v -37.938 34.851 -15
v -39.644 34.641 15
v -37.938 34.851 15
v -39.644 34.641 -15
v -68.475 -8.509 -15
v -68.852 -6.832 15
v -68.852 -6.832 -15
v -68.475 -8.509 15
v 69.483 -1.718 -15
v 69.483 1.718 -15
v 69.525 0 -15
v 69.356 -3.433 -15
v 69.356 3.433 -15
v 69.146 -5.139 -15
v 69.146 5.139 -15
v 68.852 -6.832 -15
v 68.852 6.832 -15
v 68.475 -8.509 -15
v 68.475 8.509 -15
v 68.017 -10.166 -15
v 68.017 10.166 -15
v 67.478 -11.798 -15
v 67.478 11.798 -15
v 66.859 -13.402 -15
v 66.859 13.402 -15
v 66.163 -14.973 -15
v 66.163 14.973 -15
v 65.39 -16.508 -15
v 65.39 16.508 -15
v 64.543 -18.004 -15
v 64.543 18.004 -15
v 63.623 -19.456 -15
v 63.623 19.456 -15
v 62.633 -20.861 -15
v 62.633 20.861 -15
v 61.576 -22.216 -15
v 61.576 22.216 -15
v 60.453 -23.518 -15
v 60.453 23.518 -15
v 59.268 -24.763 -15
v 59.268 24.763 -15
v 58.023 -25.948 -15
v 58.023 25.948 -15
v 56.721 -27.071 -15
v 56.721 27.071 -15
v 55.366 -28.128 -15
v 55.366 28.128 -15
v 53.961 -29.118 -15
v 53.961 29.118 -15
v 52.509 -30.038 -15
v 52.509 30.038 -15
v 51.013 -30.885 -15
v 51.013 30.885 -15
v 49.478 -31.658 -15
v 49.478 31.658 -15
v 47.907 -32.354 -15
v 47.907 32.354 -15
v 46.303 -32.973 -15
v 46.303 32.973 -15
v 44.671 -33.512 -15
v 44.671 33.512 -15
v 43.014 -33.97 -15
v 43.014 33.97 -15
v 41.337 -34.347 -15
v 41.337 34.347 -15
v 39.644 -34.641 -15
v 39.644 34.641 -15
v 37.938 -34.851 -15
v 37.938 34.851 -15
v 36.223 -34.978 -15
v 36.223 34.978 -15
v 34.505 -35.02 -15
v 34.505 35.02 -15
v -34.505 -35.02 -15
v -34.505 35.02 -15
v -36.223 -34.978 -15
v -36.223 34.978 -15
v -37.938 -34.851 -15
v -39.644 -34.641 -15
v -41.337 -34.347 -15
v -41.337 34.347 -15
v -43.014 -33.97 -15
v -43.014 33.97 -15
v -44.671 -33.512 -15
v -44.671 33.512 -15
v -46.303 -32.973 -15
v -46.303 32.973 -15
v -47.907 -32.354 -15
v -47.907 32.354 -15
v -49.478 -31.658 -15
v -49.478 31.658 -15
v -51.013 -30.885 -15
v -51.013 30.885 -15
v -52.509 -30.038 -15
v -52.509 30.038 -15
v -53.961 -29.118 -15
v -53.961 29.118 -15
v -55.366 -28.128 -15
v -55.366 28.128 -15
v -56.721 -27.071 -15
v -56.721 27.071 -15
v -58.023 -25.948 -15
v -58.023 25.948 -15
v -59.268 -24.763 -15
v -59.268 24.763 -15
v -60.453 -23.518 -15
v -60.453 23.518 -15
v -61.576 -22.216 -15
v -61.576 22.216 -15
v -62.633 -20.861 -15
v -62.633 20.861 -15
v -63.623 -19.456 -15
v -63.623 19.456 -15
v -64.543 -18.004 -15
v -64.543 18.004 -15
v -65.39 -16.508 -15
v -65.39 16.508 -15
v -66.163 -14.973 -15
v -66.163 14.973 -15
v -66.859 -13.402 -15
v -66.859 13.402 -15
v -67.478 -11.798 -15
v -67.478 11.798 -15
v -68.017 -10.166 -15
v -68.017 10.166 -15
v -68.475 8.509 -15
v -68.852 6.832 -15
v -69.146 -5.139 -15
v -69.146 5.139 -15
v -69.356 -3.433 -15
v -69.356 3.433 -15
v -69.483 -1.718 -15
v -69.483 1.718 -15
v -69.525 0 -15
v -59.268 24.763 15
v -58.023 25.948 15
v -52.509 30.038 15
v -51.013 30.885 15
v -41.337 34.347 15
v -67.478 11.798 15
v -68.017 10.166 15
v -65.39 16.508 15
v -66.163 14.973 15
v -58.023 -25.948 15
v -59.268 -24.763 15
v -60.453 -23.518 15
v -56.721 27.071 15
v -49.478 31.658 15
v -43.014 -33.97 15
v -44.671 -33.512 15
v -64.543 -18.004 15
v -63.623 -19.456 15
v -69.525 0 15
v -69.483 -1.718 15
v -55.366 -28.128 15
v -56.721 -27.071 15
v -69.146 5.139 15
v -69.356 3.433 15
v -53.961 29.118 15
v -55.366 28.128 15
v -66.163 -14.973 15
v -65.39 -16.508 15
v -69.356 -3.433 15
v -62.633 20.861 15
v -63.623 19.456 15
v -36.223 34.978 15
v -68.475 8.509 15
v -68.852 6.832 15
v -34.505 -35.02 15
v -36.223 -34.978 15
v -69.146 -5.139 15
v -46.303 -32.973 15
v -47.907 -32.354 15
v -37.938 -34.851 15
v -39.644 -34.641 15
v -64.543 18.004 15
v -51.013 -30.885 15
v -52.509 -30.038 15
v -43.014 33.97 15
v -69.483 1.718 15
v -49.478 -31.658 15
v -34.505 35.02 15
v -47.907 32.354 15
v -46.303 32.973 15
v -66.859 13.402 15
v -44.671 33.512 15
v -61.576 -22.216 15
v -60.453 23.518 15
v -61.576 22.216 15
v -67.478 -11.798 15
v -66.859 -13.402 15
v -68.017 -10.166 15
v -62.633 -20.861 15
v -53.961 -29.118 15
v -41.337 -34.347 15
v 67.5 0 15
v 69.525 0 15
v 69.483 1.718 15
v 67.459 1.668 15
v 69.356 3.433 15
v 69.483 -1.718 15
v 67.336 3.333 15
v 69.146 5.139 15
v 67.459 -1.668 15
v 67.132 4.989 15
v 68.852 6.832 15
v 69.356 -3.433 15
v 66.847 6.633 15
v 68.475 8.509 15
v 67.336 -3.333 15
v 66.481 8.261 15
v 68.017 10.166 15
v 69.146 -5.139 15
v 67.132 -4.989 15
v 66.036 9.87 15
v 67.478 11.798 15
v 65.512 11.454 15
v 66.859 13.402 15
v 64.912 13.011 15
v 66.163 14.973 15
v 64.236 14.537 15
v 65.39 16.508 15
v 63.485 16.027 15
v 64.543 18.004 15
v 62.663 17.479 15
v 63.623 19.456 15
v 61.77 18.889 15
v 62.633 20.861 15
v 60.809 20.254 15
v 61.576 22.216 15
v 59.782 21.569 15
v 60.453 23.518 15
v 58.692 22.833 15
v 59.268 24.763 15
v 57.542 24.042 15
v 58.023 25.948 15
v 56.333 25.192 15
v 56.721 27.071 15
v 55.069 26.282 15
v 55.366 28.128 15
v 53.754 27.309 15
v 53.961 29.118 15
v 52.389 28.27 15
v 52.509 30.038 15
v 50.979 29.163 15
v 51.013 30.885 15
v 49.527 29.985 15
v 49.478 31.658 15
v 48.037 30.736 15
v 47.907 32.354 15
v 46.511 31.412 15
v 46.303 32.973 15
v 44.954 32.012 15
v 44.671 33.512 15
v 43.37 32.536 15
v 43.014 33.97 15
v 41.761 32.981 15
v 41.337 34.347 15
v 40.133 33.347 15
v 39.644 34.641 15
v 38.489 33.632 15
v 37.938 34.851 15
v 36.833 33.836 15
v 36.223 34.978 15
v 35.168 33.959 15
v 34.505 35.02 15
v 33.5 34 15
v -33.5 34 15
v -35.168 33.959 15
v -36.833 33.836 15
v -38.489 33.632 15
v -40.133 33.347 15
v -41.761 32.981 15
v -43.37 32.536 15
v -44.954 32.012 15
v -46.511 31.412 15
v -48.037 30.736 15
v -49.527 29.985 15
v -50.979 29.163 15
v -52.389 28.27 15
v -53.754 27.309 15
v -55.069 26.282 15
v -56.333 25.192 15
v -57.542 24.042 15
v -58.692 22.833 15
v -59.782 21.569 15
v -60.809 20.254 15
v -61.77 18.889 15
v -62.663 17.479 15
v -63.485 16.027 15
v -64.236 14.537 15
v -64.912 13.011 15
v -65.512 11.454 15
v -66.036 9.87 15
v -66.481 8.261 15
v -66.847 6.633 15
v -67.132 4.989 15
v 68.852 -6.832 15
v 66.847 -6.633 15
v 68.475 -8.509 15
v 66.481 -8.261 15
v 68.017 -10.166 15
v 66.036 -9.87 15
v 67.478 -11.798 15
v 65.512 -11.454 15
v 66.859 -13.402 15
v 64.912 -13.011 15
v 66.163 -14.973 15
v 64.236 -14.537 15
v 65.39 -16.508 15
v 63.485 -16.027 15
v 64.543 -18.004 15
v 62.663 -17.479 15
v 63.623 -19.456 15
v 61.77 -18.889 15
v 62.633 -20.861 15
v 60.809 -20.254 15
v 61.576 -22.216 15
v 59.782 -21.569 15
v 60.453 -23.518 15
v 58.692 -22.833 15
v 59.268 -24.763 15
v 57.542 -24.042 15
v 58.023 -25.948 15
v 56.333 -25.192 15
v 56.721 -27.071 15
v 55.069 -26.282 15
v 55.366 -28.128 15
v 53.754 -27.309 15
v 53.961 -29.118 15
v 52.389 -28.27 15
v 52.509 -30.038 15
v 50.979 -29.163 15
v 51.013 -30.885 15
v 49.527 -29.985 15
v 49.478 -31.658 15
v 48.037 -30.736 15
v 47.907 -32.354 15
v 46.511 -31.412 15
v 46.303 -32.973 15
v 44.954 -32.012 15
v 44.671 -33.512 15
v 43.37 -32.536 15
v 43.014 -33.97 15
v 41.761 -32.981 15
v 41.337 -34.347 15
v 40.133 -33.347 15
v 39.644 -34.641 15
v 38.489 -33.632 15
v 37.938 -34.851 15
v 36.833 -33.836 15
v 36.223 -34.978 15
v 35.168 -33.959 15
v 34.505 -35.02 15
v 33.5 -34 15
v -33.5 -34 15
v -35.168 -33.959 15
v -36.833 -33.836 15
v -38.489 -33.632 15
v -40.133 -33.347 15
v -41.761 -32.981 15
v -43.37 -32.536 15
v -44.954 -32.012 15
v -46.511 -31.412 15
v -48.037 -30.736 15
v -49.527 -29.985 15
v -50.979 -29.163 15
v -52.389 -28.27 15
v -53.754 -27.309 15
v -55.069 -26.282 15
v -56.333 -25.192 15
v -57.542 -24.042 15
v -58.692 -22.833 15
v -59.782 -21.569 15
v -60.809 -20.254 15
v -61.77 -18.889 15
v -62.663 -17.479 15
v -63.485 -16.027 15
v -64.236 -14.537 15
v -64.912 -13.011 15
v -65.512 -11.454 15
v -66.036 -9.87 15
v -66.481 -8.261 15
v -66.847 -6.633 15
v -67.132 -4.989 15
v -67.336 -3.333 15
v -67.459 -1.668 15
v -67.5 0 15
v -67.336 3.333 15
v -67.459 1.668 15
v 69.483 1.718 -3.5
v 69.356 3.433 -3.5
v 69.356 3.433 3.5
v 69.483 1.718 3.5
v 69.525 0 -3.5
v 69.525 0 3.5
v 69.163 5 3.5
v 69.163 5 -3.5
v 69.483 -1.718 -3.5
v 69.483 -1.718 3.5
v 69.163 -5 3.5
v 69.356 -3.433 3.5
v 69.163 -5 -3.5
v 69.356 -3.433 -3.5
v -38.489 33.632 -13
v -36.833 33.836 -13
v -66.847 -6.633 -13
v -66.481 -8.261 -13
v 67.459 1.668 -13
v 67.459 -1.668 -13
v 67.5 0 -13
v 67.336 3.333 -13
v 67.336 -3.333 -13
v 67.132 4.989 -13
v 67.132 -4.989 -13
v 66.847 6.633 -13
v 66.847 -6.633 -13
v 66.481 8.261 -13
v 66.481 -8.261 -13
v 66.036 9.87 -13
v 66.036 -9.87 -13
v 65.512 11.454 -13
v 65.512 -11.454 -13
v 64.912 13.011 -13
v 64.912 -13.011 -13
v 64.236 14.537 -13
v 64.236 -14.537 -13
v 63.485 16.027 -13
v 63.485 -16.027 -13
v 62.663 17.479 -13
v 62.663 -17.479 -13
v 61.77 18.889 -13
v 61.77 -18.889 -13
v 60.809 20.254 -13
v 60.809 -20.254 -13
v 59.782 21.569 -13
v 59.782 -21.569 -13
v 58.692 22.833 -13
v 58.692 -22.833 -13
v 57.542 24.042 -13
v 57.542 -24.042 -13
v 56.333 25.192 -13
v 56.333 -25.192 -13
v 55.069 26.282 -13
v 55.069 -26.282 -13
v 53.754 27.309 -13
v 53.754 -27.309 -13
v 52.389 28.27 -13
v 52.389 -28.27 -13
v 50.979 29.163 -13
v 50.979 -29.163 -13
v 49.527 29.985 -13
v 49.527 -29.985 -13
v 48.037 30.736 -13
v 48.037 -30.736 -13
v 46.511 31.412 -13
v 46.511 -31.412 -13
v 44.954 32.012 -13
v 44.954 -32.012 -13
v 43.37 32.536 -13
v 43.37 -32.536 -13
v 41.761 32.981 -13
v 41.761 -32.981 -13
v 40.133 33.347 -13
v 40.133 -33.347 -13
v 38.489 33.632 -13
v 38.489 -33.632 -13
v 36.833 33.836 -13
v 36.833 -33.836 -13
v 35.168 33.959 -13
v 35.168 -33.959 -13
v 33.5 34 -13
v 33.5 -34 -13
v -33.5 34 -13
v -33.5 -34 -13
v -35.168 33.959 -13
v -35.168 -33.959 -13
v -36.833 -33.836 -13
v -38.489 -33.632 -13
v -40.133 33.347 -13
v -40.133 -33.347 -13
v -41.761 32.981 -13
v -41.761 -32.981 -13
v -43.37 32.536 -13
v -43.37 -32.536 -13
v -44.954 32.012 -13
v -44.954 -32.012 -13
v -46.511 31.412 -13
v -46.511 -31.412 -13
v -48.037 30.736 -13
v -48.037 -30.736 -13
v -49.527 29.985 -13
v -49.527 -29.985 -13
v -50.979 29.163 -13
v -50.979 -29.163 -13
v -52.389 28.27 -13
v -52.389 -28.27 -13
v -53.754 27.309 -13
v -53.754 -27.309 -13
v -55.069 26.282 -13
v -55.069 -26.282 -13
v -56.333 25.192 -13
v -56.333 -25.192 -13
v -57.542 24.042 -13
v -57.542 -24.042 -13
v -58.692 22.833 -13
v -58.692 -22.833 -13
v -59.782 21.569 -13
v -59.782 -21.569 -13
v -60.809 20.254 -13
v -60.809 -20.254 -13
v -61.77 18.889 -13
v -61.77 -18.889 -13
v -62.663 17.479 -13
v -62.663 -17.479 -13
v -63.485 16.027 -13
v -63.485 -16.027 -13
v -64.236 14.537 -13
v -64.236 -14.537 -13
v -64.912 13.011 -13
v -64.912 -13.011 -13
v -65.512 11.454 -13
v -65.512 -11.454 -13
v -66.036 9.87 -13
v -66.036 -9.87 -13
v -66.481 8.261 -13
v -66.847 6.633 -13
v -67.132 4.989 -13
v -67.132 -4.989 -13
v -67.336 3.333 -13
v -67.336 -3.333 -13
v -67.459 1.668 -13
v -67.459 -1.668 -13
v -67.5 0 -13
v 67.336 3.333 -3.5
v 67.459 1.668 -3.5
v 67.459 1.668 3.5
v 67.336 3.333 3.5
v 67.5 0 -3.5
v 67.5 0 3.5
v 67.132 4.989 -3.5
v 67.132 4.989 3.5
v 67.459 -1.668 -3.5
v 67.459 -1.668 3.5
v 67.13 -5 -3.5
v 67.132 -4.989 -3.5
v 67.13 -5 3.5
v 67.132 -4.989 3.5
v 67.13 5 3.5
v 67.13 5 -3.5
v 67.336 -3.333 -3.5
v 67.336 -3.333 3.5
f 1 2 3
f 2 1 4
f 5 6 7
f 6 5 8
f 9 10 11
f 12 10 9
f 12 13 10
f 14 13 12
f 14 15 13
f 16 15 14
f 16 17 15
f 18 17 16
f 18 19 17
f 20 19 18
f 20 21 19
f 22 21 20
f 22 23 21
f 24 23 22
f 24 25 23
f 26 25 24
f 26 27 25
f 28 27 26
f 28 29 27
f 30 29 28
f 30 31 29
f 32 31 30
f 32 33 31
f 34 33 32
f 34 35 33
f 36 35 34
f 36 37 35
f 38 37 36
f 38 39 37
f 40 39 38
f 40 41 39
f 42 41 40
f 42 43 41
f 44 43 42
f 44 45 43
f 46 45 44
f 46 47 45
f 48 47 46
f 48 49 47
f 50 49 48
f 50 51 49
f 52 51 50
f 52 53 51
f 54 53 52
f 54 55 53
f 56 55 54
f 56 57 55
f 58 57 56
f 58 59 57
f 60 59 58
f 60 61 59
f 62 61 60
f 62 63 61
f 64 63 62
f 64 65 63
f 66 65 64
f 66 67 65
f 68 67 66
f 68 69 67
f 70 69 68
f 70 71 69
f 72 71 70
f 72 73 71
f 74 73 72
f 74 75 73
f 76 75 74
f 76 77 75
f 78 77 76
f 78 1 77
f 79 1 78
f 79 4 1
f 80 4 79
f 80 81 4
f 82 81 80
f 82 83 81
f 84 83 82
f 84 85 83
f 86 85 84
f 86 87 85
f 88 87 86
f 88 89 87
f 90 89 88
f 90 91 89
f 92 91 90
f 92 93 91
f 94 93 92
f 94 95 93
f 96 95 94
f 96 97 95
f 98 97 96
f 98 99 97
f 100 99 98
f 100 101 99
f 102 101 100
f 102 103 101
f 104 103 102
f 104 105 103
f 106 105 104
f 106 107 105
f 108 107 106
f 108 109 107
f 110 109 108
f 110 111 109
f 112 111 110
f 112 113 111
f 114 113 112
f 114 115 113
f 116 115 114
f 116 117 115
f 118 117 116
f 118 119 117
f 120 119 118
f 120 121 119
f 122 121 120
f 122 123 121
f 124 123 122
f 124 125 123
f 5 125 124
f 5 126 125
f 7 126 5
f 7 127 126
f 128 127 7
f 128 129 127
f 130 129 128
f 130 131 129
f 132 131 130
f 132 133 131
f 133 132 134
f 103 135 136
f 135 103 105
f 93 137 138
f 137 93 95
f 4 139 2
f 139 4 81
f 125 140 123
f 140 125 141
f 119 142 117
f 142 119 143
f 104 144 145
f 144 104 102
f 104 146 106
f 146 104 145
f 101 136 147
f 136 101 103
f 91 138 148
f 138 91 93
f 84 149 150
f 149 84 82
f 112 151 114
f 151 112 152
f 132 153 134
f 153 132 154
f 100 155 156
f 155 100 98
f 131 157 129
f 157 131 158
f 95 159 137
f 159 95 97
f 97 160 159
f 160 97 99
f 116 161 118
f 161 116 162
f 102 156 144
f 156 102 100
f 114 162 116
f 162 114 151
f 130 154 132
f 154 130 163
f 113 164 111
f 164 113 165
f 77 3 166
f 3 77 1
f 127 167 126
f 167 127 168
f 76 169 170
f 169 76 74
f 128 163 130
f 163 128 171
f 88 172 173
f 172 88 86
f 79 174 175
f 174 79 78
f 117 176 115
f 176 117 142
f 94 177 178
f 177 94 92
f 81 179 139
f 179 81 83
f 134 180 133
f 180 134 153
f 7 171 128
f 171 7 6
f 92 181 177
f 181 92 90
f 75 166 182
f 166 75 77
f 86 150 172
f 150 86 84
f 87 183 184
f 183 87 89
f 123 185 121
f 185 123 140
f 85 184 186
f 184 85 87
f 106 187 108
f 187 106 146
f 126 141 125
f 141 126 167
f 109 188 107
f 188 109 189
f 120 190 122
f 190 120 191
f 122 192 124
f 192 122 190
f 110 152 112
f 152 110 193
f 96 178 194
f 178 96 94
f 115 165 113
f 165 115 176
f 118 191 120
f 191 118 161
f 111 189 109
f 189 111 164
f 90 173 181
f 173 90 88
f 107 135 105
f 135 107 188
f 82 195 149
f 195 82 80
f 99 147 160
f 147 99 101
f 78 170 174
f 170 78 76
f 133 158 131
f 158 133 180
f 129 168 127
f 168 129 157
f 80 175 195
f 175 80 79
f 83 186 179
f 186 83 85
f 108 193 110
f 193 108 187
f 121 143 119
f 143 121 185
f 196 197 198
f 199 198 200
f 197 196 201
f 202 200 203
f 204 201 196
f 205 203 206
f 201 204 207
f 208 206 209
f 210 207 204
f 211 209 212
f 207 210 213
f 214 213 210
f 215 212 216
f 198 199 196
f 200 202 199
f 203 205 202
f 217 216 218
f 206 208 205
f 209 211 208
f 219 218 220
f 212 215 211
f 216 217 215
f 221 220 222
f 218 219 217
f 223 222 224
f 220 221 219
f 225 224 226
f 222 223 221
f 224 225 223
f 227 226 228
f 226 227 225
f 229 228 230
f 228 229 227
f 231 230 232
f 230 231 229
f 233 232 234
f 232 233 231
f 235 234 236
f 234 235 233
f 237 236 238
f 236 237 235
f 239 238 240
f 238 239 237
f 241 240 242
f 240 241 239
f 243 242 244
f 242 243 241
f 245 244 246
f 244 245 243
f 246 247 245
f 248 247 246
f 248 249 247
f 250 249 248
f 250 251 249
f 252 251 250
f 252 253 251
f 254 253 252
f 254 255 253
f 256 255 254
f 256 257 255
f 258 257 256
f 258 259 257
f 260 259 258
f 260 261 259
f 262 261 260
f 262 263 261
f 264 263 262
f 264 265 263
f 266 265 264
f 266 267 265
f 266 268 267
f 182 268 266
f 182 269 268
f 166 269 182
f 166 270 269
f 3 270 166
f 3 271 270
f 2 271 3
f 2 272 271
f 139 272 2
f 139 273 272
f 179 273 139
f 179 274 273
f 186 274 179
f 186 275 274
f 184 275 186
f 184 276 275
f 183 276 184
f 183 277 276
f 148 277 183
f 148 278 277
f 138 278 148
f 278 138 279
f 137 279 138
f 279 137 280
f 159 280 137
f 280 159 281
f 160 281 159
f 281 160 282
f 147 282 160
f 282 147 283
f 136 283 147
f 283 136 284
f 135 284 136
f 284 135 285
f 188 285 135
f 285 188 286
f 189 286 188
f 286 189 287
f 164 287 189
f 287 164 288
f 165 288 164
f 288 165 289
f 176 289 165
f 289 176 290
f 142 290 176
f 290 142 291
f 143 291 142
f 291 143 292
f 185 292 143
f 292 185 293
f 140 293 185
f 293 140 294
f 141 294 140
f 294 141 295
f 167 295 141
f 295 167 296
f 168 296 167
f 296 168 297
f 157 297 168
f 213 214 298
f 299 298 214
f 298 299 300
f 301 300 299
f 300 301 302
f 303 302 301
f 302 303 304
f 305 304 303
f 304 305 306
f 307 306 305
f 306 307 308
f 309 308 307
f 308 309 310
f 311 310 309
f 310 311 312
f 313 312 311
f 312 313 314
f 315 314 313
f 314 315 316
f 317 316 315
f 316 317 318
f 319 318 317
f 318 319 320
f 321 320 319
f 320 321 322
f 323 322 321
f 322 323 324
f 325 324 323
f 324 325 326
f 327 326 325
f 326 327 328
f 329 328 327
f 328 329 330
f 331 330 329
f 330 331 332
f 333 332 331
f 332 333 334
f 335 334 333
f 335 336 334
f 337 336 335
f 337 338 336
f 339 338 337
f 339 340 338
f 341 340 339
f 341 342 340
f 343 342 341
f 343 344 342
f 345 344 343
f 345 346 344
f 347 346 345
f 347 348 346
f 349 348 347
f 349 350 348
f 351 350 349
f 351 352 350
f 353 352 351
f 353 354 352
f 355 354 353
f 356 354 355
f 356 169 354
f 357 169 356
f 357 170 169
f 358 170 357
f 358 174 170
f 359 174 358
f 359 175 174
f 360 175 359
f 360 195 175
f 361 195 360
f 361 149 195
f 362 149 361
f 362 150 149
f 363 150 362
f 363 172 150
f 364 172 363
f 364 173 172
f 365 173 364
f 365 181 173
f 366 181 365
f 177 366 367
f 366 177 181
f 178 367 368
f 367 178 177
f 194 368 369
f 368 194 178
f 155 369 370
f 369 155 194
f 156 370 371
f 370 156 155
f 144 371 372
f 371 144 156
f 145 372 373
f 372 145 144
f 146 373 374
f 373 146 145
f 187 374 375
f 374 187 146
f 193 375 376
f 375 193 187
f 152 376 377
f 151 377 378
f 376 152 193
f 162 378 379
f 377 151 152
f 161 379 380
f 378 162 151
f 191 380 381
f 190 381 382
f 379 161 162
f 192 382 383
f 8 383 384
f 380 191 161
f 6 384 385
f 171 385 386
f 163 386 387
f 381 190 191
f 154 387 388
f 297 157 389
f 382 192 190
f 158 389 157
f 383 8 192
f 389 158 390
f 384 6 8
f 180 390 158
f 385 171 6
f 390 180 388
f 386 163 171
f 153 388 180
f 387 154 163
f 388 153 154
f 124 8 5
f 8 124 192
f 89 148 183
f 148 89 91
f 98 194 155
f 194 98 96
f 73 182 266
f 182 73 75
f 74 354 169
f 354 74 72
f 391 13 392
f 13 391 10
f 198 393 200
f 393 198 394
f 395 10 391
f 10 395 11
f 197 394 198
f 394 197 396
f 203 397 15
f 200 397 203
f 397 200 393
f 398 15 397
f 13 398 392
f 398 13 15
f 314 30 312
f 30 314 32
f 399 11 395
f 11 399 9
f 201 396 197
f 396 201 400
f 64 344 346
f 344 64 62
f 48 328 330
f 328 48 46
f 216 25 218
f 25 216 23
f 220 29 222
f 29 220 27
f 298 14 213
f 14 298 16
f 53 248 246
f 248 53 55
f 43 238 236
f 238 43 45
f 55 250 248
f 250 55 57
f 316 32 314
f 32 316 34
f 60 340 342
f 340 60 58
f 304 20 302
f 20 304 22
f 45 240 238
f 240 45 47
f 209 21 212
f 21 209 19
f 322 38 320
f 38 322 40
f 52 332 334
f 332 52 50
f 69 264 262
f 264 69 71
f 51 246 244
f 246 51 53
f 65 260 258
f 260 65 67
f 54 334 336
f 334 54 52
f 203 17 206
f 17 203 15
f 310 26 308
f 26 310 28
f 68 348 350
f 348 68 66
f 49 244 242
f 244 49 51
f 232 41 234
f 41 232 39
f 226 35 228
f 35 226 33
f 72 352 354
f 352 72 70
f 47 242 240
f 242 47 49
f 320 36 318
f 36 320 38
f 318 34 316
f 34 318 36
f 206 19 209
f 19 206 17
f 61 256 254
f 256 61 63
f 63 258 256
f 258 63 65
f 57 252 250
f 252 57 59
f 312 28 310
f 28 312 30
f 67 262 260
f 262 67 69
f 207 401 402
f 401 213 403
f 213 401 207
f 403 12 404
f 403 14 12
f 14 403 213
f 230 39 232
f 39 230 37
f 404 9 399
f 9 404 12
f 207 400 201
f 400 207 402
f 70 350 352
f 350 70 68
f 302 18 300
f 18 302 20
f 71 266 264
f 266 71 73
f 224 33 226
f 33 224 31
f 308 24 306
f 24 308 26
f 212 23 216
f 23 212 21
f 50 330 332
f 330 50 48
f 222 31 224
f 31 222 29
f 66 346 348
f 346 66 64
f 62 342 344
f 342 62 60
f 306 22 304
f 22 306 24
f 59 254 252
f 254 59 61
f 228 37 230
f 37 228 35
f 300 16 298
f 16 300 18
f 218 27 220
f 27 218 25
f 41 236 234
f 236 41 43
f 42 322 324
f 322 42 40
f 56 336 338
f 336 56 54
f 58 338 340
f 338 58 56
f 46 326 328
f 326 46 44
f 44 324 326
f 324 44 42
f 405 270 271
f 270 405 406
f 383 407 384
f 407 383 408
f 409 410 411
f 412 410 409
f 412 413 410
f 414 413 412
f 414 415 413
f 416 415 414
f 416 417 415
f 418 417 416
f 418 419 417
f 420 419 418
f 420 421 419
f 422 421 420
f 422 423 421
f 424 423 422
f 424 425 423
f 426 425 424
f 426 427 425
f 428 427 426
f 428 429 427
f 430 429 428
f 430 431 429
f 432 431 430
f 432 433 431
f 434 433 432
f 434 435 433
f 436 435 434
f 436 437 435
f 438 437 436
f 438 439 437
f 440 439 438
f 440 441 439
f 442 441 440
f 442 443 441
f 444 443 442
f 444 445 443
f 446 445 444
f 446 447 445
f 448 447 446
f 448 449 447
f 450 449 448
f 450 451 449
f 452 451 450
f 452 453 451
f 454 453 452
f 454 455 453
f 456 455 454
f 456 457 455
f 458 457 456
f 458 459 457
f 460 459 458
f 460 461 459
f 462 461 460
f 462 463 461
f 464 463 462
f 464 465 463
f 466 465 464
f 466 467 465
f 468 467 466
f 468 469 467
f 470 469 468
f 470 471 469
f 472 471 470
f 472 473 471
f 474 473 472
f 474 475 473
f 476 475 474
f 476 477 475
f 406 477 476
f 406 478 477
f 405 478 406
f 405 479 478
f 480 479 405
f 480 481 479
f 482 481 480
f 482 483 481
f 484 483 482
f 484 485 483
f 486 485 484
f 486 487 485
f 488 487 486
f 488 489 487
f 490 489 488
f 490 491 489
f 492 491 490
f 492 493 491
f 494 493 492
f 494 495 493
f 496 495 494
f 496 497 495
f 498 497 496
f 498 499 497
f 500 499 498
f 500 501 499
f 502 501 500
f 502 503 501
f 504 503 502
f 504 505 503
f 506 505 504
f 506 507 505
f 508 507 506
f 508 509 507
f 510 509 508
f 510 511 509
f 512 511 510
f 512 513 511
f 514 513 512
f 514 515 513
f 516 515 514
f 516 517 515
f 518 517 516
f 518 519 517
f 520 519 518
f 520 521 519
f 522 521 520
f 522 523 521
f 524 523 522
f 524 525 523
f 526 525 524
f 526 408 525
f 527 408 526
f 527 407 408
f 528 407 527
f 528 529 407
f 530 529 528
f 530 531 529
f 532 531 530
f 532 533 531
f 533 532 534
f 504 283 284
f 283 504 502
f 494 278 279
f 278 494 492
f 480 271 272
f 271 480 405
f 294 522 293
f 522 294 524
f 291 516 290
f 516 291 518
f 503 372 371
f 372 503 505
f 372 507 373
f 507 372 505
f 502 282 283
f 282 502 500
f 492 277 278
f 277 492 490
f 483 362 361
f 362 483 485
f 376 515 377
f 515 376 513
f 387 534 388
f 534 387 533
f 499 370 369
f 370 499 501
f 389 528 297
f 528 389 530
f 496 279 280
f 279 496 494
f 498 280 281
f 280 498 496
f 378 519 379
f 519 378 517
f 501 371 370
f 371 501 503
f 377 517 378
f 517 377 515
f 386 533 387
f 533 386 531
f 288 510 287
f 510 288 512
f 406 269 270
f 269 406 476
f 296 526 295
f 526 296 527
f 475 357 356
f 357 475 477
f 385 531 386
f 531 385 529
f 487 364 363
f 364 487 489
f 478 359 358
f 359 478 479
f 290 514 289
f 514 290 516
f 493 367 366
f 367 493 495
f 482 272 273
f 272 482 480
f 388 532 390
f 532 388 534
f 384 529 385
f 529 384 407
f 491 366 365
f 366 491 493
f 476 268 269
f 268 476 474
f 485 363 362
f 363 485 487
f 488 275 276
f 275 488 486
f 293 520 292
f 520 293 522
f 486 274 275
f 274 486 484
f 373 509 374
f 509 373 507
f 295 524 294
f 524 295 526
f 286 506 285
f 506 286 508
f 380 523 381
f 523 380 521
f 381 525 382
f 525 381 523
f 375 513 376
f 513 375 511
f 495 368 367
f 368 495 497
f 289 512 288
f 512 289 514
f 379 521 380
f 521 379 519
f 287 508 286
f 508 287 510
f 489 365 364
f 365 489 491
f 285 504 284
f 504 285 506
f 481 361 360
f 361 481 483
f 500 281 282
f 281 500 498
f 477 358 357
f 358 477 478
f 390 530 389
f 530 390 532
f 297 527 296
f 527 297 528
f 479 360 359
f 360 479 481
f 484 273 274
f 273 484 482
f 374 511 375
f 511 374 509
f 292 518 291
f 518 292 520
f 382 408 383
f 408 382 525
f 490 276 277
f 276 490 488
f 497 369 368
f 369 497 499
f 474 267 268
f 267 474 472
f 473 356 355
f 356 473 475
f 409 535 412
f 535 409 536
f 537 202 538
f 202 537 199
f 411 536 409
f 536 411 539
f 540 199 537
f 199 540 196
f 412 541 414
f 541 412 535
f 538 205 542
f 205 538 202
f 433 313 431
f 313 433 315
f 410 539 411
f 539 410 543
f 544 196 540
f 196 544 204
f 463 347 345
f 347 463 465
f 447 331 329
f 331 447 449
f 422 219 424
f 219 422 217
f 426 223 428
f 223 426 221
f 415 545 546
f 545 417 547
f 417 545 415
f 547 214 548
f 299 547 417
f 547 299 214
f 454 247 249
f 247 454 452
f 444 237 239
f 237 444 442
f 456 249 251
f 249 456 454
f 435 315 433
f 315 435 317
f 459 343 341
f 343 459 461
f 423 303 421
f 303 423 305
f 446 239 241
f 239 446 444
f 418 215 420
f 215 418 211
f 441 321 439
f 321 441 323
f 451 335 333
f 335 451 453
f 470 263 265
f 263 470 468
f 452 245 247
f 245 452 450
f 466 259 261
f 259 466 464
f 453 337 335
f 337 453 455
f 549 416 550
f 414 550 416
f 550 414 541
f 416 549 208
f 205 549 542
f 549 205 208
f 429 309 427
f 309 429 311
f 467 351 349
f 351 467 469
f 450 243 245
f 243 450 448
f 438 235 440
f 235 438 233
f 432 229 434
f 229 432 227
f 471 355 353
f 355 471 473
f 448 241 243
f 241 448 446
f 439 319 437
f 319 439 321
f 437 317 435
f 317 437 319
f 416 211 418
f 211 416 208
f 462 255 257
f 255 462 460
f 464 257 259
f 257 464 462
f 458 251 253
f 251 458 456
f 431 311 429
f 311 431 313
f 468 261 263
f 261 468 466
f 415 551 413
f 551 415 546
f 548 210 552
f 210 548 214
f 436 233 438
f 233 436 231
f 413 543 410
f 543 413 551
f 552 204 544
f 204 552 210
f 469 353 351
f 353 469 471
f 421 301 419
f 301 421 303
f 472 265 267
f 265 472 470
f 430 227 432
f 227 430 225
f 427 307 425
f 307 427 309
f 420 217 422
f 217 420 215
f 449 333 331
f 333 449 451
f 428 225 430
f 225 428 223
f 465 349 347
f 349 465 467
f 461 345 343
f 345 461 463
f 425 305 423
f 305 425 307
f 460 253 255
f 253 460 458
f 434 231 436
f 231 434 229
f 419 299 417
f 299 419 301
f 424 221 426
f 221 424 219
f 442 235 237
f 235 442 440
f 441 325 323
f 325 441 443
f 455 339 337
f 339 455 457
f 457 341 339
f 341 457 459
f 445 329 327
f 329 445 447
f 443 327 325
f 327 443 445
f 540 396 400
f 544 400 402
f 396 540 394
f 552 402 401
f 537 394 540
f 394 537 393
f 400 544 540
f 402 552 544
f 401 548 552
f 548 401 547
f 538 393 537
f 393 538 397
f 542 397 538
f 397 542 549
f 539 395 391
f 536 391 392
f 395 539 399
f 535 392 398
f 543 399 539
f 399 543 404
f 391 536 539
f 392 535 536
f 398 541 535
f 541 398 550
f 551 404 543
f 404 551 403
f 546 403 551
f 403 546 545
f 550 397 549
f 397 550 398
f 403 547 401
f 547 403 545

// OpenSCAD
$fn=128;
module base() {
    translate([-(135-68)/2,0,0]) cylinder(r=68/2, h=30, center=true);
    translate([0,0,0]) cube([135-68,68,30], center=true);
    translate([(135-68)/2,0,0]) cylinder(r=68/2, h=30, center=true);
    
}

difference(){
    scale([1.03,1.03,1])
        base();
    translate([0,0,2])
        base();
    translate([60,0,0])
        cube([20,10,7],center=true);
}
